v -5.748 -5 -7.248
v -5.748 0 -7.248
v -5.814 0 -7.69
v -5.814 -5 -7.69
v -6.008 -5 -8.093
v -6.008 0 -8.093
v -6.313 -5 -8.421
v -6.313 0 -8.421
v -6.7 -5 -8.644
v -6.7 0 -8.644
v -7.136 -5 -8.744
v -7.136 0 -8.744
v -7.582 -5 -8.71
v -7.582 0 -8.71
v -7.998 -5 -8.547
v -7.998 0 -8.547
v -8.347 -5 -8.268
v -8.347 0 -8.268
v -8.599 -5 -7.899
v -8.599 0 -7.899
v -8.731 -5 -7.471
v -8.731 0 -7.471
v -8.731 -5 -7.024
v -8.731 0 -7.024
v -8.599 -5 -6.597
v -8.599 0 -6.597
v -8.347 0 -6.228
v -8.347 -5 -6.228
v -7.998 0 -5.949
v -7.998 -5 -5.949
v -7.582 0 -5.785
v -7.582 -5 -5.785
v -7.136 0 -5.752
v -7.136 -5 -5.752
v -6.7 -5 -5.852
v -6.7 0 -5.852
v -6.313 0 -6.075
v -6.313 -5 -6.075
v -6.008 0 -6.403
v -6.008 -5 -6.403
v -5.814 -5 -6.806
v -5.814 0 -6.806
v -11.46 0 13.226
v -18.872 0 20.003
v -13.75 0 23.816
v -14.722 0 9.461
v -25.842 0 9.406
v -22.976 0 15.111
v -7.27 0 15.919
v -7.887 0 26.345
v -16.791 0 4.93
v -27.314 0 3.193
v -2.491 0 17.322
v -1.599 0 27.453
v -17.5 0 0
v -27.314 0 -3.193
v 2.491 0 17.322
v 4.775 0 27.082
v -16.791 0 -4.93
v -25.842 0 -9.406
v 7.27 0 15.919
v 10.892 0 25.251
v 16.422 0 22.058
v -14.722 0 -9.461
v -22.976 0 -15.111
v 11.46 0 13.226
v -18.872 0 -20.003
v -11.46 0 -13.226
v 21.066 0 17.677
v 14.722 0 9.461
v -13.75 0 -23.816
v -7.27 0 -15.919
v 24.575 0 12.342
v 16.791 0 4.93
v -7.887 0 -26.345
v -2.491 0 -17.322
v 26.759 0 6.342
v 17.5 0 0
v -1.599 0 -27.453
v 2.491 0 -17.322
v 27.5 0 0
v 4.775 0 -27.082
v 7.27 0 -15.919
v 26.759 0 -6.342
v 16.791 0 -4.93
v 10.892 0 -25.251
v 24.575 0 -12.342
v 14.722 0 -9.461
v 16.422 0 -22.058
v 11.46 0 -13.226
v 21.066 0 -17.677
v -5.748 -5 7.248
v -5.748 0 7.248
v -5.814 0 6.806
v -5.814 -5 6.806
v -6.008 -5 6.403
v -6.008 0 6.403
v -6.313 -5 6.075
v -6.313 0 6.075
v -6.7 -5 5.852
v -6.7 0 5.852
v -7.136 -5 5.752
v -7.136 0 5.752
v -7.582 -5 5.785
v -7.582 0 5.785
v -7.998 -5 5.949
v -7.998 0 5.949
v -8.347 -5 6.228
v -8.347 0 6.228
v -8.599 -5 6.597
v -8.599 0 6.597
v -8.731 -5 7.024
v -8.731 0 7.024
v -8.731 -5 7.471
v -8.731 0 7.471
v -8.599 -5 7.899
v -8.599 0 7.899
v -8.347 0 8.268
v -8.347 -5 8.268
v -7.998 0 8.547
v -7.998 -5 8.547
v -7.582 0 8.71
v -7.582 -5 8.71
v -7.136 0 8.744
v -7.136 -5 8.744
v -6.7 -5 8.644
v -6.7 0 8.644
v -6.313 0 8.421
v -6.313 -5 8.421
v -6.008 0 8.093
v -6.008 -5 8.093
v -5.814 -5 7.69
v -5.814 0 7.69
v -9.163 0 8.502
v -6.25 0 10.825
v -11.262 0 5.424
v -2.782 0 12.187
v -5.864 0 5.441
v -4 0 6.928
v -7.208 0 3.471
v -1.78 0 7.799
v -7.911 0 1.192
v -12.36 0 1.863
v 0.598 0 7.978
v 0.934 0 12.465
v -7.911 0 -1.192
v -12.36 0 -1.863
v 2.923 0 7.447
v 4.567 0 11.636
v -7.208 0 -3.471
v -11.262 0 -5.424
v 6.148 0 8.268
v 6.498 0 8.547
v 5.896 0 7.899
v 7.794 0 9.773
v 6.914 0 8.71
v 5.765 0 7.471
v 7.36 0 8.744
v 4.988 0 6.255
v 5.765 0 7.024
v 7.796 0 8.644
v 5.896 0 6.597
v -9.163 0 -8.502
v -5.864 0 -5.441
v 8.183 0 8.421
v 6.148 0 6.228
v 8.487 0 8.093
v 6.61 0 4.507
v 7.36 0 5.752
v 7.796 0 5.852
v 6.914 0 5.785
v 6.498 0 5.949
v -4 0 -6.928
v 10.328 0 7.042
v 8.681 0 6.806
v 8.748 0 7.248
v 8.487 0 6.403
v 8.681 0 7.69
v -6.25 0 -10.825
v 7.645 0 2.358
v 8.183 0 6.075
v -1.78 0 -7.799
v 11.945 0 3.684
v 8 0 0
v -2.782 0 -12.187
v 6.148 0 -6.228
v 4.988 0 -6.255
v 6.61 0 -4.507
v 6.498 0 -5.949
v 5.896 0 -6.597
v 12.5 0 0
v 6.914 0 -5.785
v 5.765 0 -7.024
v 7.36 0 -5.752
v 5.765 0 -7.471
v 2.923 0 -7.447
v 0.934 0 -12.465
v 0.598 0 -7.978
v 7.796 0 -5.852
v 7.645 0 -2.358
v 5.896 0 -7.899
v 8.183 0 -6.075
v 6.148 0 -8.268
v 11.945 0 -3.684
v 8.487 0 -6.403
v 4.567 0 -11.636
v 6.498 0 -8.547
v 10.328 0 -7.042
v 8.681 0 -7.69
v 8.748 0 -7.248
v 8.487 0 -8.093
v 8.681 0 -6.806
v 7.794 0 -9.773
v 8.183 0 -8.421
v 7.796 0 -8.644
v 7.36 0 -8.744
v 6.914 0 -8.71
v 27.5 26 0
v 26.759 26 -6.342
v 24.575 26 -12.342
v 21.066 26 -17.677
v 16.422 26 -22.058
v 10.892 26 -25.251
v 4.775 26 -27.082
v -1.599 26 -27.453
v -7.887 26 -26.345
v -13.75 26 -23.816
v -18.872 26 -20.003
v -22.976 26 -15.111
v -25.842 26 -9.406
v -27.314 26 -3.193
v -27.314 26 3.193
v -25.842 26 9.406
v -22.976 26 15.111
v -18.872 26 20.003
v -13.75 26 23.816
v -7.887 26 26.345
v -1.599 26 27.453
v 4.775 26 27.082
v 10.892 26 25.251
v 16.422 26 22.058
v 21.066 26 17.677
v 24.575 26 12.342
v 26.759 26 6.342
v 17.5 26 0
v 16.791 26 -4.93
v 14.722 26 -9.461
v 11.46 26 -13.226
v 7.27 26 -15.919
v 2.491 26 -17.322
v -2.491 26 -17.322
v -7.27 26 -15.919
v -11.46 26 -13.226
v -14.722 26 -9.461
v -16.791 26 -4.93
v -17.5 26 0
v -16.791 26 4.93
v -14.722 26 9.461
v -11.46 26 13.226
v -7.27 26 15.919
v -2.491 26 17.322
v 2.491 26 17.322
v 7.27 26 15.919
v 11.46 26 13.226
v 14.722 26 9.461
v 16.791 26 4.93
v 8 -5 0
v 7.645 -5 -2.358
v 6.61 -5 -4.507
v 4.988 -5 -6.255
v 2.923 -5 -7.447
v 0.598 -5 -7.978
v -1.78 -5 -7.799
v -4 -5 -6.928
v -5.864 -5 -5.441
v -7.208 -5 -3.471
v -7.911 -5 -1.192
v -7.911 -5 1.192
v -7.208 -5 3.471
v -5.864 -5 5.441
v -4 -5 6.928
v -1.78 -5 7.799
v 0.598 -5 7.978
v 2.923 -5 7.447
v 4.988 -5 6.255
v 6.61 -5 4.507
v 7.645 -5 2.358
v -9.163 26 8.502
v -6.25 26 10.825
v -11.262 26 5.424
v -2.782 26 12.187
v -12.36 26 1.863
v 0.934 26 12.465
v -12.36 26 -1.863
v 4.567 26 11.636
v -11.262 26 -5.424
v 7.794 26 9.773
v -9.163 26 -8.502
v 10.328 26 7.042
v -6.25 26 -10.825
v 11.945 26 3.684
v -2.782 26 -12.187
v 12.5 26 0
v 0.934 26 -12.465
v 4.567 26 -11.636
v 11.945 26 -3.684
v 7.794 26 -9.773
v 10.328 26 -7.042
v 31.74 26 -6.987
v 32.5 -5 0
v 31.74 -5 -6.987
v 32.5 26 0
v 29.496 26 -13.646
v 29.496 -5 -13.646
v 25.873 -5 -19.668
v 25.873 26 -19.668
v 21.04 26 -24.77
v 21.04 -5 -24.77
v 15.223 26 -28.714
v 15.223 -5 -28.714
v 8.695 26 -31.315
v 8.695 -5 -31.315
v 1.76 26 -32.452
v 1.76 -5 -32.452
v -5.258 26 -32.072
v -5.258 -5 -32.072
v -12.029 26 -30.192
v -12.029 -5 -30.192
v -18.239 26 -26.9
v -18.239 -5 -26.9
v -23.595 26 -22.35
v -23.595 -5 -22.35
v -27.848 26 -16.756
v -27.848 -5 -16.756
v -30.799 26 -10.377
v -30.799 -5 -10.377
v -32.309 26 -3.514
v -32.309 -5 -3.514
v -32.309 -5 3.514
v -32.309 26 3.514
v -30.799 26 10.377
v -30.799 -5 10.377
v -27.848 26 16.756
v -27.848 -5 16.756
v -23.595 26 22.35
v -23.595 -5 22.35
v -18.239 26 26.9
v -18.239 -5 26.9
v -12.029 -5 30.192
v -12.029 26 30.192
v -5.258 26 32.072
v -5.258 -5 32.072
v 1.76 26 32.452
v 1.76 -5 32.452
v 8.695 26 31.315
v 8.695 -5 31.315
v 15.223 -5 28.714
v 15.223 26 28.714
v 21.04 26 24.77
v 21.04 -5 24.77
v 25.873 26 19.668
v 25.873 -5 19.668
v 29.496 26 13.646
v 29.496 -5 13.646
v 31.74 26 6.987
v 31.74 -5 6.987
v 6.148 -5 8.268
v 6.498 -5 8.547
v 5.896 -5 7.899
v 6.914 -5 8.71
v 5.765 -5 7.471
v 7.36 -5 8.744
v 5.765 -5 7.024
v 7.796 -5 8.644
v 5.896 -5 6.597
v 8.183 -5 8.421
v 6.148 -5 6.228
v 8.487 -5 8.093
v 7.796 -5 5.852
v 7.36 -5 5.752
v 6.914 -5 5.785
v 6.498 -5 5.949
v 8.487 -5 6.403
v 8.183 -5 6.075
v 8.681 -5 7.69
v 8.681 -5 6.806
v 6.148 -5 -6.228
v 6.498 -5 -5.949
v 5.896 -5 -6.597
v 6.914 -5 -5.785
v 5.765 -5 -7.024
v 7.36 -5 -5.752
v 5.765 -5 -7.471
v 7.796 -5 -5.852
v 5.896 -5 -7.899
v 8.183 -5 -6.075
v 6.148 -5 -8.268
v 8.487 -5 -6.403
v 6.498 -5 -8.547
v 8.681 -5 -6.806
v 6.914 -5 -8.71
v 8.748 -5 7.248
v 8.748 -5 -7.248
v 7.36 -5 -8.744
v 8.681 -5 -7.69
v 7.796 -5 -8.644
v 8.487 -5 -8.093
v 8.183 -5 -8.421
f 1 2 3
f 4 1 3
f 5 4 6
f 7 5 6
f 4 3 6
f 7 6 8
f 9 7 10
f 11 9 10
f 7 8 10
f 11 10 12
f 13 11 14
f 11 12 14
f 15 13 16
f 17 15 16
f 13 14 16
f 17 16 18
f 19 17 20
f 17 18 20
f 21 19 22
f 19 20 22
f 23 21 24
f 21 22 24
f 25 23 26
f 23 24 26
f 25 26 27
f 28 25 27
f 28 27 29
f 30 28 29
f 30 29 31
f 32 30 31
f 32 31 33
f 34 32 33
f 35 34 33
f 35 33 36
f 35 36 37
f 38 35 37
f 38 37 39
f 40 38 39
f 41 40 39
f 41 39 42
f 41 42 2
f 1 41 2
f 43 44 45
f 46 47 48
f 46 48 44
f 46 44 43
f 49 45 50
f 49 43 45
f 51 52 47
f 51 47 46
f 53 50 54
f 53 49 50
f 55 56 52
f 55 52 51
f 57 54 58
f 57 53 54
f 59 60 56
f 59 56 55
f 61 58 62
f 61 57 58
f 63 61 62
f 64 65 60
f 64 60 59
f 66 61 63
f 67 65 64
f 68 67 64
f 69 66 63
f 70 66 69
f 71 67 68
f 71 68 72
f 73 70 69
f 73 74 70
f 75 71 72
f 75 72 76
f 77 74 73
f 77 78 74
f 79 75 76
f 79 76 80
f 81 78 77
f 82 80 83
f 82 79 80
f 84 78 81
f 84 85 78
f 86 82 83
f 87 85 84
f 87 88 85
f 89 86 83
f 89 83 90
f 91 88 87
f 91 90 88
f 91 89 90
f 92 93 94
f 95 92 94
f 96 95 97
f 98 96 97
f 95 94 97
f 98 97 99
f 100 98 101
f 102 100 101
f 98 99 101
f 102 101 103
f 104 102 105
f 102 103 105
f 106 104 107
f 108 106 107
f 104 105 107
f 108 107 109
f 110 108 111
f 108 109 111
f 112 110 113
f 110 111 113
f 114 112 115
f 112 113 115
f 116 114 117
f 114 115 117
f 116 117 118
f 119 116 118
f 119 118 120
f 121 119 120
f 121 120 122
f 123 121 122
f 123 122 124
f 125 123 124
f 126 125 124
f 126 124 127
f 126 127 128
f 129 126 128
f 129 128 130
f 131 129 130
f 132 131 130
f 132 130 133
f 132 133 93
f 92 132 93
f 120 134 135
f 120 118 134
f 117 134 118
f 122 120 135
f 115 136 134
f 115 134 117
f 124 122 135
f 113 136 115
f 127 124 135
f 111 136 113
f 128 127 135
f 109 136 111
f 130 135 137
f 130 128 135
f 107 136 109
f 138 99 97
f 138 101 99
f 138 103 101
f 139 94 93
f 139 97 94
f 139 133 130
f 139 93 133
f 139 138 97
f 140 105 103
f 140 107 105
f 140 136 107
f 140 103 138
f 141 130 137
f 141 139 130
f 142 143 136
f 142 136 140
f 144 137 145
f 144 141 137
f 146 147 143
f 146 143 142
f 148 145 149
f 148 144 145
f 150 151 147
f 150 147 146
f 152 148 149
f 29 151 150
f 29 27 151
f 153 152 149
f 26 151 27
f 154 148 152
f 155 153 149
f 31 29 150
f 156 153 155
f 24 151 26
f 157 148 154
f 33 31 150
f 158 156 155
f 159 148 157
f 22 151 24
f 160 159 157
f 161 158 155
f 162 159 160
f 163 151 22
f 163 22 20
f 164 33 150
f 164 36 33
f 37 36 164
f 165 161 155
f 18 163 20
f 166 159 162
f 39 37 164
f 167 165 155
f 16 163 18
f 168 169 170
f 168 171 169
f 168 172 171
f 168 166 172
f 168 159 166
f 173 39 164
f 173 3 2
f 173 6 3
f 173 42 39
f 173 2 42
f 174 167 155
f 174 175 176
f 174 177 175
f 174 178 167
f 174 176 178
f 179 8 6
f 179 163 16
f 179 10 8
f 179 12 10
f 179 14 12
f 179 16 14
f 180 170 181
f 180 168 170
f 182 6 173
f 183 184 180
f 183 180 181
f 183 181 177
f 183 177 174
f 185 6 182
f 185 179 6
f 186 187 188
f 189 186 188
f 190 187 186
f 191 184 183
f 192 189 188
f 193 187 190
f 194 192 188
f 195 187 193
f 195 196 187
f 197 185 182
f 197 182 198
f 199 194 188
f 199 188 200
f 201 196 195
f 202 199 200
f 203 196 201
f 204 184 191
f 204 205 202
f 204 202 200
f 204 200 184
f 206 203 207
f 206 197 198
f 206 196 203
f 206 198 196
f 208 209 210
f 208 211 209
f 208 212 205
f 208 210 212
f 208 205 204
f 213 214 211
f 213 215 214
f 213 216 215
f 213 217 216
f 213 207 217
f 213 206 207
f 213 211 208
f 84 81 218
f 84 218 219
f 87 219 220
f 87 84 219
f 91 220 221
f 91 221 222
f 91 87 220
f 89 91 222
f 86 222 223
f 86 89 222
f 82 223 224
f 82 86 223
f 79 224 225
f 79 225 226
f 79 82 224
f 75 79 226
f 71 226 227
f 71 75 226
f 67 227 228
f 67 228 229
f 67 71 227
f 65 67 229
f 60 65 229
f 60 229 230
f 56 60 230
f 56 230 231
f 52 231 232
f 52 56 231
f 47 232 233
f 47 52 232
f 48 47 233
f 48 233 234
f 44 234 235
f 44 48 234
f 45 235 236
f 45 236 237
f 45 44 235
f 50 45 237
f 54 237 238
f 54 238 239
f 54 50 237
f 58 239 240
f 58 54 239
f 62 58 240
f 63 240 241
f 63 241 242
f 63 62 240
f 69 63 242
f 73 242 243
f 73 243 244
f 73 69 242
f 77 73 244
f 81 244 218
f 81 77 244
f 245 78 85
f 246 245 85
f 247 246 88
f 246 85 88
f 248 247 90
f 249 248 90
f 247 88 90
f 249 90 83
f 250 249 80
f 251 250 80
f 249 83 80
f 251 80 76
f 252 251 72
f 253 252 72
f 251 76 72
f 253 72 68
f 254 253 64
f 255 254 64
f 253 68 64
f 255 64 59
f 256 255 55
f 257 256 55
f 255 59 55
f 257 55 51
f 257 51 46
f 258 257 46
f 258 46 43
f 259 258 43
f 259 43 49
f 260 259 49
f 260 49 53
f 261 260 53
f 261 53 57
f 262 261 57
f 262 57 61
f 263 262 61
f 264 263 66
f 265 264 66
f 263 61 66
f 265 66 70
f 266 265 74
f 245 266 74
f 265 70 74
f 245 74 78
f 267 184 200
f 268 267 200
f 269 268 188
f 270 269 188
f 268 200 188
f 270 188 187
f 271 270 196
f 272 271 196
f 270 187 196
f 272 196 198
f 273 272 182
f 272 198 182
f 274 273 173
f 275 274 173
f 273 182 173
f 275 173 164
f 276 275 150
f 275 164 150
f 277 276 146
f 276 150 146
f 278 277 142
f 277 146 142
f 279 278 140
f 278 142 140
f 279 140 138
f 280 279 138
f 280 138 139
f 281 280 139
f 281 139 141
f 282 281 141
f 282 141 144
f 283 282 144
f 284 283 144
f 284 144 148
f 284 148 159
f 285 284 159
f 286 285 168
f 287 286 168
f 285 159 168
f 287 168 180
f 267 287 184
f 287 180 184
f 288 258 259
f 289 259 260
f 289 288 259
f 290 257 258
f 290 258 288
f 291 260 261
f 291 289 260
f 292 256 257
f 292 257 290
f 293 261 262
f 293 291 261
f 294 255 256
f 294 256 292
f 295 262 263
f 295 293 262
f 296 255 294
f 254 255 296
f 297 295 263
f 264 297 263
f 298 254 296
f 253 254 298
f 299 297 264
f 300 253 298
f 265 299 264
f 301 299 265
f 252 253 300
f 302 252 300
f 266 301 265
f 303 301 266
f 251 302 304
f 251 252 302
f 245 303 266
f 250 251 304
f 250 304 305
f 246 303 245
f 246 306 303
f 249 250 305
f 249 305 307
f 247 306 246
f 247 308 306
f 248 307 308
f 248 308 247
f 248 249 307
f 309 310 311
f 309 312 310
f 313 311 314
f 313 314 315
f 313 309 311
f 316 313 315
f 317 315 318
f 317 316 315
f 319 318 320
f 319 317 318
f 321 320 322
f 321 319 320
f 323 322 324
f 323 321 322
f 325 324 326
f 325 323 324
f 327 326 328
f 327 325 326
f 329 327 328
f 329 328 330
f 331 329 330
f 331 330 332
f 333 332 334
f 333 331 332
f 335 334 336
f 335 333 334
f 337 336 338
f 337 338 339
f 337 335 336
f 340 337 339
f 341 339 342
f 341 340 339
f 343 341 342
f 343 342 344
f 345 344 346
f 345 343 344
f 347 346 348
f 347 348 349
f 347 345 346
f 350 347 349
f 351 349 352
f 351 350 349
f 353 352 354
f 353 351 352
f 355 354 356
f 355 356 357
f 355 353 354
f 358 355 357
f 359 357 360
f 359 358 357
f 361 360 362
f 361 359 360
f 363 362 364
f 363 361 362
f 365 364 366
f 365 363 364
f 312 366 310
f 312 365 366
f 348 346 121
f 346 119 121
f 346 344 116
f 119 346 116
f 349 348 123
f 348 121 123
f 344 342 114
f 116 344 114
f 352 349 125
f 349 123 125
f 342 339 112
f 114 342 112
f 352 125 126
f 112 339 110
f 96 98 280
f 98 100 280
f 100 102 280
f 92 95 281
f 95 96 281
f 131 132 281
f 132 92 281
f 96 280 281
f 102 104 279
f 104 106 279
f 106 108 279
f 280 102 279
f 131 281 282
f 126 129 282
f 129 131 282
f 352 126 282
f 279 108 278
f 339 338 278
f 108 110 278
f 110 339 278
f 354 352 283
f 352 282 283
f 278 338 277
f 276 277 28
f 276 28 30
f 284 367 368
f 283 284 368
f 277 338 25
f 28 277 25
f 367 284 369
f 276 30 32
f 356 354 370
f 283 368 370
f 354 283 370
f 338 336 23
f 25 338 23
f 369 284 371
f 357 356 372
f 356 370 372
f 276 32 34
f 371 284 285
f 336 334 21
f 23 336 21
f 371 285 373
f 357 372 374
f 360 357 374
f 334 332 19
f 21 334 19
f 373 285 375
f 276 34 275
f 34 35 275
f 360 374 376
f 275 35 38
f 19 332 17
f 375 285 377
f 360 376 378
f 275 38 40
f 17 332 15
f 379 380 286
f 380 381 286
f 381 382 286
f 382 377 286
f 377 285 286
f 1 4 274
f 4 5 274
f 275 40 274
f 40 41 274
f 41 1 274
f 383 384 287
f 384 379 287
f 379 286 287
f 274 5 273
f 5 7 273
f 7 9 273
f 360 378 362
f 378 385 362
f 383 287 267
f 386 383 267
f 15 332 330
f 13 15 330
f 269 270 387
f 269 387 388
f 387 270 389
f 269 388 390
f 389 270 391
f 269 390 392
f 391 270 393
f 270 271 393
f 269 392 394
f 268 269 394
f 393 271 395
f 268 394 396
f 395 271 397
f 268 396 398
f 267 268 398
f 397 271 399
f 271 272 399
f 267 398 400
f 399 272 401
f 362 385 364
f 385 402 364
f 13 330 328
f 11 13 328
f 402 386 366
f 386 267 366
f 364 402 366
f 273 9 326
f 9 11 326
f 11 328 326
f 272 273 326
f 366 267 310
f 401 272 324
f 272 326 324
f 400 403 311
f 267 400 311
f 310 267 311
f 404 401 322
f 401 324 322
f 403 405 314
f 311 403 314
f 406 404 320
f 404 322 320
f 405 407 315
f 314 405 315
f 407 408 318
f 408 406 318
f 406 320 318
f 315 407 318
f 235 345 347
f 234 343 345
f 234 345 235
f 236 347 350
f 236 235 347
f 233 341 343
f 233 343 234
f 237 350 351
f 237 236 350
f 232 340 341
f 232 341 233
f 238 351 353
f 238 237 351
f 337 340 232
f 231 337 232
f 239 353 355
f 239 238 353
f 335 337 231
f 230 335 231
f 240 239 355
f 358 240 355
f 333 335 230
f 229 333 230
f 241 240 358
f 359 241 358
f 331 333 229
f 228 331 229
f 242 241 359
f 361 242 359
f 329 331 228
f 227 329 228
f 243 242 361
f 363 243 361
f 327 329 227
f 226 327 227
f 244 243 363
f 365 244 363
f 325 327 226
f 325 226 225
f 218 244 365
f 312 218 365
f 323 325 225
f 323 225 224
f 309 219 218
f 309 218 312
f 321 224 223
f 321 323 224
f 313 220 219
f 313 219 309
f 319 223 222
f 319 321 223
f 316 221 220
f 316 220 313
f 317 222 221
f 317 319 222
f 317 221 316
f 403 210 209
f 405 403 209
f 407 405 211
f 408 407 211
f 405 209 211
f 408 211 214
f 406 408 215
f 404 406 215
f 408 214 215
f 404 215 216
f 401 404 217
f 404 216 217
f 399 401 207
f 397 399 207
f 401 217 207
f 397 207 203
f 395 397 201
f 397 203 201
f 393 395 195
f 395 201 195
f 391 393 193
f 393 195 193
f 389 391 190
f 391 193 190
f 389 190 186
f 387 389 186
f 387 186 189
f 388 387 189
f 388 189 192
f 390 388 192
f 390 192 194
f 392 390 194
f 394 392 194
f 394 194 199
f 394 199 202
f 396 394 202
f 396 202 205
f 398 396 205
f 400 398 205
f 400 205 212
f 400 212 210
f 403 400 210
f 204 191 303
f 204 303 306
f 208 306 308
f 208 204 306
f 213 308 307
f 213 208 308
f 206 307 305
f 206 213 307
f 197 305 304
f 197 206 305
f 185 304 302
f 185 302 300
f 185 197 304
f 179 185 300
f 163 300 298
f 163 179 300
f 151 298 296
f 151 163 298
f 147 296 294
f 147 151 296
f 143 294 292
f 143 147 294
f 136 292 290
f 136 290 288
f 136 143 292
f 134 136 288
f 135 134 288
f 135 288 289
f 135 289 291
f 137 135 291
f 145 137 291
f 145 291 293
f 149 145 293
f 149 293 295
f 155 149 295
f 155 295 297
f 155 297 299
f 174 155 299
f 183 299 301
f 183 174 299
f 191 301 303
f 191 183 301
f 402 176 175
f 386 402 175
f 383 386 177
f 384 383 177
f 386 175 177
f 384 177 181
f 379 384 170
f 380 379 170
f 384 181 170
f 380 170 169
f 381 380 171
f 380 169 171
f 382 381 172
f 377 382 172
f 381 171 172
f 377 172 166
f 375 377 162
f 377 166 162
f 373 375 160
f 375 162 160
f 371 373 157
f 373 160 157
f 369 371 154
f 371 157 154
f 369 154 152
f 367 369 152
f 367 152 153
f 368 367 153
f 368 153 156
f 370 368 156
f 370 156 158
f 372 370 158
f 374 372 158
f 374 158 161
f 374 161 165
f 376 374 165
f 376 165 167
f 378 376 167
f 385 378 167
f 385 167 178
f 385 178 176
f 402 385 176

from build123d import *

# Parameters (mm, degrees)
SKETCH1_R               = 32.5
SKETCH1_R_2             = 27.5
BOSS_EXTRUDE2_DEPTH     = 26
SKETCH1_R_3             = 17.5
SKETCH1_R_4             = 12.5
BOSS_EXTRUDE2_2_DEPTH   = 26
SKETCH2_R               = 32.5
SKETCH2_R_2             = 8
BOSS_EXTRUDE3_DEPTH     = 5
SKETCH3_R               = 1.5
CUT_EXTRUDE1_DEPTH      = 3
CUT_EXTRUDE1_DEPTH_BACK = 6


with BuildPart() as part:
    # Sketch1 → Boss-Extrude2 (new body)
    with BuildSketch(Plane(origin=(0, 0, 0), x_dir=(1, 0, 0), z_dir=(0, 1, 0))):
        Circle(SKETCH1_R)
        Circle(SKETCH1_R_2, mode=Mode.SUBTRACT)
    extrude(amount=BOSS_EXTRUDE2_DEPTH)



with BuildPart() as body_2:
    # Sketch1 → Boss-Extrude2 2 (new body)
    with BuildSketch(Plane(origin=(0, 0, 0), x_dir=(1, 0, 0), z_dir=(0, 1, 0))):
        Circle(SKETCH1_R_3)
        Circle(SKETCH1_R_4, mode=Mode.SUBTRACT)
    extrude(amount=BOSS_EXTRUDE2_2_DEPTH)


with BuildPart() as part_1:
    add(part.part)

    add(body_2.part)  # Boss-Extrude3 merges body 2
    # Sketch2 → Boss-Extrude3 (add)
    with BuildSketch(Plane(origin=(0, 0, 0), x_dir=(1, 0, 0), z_dir=(0, 1, 0))):
        Circle(SKETCH2_R)
        Circle(SKETCH2_R_2, mode=Mode.SUBTRACT)
    extrude(amount=-BOSS_EXTRUDE3_DEPTH)

    # Sketch3 → Cut-Extrude1 (cut, two sides)
    with BuildSketch(Plane(origin=(0, 0, 0), x_dir=(1, 0, 0), z_dir=(0, 1, 0))) as cut_extrude1_sk:
        with Locations((-7.247844507, 7.247844507)):
            Circle(SKETCH3_R)
        with Locations((7.247844507, 7.247844507)):
            Circle(SKETCH3_R)
        with Locations((7.247844507, -7.247844507)):
            Circle(SKETCH3_R)
        with Locations((-7.247844507, -7.247844507)):
            Circle(SKETCH3_R)
    extrude(amount=CUT_EXTRUDE1_DEPTH, mode=Mode.SUBTRACT)
    extrude(cut_extrude1_sk.sketch, amount=-CUT_EXTRUDE1_DEPTH_BACK, mode=Mode.SUBTRACT)


solid = part_1.part
